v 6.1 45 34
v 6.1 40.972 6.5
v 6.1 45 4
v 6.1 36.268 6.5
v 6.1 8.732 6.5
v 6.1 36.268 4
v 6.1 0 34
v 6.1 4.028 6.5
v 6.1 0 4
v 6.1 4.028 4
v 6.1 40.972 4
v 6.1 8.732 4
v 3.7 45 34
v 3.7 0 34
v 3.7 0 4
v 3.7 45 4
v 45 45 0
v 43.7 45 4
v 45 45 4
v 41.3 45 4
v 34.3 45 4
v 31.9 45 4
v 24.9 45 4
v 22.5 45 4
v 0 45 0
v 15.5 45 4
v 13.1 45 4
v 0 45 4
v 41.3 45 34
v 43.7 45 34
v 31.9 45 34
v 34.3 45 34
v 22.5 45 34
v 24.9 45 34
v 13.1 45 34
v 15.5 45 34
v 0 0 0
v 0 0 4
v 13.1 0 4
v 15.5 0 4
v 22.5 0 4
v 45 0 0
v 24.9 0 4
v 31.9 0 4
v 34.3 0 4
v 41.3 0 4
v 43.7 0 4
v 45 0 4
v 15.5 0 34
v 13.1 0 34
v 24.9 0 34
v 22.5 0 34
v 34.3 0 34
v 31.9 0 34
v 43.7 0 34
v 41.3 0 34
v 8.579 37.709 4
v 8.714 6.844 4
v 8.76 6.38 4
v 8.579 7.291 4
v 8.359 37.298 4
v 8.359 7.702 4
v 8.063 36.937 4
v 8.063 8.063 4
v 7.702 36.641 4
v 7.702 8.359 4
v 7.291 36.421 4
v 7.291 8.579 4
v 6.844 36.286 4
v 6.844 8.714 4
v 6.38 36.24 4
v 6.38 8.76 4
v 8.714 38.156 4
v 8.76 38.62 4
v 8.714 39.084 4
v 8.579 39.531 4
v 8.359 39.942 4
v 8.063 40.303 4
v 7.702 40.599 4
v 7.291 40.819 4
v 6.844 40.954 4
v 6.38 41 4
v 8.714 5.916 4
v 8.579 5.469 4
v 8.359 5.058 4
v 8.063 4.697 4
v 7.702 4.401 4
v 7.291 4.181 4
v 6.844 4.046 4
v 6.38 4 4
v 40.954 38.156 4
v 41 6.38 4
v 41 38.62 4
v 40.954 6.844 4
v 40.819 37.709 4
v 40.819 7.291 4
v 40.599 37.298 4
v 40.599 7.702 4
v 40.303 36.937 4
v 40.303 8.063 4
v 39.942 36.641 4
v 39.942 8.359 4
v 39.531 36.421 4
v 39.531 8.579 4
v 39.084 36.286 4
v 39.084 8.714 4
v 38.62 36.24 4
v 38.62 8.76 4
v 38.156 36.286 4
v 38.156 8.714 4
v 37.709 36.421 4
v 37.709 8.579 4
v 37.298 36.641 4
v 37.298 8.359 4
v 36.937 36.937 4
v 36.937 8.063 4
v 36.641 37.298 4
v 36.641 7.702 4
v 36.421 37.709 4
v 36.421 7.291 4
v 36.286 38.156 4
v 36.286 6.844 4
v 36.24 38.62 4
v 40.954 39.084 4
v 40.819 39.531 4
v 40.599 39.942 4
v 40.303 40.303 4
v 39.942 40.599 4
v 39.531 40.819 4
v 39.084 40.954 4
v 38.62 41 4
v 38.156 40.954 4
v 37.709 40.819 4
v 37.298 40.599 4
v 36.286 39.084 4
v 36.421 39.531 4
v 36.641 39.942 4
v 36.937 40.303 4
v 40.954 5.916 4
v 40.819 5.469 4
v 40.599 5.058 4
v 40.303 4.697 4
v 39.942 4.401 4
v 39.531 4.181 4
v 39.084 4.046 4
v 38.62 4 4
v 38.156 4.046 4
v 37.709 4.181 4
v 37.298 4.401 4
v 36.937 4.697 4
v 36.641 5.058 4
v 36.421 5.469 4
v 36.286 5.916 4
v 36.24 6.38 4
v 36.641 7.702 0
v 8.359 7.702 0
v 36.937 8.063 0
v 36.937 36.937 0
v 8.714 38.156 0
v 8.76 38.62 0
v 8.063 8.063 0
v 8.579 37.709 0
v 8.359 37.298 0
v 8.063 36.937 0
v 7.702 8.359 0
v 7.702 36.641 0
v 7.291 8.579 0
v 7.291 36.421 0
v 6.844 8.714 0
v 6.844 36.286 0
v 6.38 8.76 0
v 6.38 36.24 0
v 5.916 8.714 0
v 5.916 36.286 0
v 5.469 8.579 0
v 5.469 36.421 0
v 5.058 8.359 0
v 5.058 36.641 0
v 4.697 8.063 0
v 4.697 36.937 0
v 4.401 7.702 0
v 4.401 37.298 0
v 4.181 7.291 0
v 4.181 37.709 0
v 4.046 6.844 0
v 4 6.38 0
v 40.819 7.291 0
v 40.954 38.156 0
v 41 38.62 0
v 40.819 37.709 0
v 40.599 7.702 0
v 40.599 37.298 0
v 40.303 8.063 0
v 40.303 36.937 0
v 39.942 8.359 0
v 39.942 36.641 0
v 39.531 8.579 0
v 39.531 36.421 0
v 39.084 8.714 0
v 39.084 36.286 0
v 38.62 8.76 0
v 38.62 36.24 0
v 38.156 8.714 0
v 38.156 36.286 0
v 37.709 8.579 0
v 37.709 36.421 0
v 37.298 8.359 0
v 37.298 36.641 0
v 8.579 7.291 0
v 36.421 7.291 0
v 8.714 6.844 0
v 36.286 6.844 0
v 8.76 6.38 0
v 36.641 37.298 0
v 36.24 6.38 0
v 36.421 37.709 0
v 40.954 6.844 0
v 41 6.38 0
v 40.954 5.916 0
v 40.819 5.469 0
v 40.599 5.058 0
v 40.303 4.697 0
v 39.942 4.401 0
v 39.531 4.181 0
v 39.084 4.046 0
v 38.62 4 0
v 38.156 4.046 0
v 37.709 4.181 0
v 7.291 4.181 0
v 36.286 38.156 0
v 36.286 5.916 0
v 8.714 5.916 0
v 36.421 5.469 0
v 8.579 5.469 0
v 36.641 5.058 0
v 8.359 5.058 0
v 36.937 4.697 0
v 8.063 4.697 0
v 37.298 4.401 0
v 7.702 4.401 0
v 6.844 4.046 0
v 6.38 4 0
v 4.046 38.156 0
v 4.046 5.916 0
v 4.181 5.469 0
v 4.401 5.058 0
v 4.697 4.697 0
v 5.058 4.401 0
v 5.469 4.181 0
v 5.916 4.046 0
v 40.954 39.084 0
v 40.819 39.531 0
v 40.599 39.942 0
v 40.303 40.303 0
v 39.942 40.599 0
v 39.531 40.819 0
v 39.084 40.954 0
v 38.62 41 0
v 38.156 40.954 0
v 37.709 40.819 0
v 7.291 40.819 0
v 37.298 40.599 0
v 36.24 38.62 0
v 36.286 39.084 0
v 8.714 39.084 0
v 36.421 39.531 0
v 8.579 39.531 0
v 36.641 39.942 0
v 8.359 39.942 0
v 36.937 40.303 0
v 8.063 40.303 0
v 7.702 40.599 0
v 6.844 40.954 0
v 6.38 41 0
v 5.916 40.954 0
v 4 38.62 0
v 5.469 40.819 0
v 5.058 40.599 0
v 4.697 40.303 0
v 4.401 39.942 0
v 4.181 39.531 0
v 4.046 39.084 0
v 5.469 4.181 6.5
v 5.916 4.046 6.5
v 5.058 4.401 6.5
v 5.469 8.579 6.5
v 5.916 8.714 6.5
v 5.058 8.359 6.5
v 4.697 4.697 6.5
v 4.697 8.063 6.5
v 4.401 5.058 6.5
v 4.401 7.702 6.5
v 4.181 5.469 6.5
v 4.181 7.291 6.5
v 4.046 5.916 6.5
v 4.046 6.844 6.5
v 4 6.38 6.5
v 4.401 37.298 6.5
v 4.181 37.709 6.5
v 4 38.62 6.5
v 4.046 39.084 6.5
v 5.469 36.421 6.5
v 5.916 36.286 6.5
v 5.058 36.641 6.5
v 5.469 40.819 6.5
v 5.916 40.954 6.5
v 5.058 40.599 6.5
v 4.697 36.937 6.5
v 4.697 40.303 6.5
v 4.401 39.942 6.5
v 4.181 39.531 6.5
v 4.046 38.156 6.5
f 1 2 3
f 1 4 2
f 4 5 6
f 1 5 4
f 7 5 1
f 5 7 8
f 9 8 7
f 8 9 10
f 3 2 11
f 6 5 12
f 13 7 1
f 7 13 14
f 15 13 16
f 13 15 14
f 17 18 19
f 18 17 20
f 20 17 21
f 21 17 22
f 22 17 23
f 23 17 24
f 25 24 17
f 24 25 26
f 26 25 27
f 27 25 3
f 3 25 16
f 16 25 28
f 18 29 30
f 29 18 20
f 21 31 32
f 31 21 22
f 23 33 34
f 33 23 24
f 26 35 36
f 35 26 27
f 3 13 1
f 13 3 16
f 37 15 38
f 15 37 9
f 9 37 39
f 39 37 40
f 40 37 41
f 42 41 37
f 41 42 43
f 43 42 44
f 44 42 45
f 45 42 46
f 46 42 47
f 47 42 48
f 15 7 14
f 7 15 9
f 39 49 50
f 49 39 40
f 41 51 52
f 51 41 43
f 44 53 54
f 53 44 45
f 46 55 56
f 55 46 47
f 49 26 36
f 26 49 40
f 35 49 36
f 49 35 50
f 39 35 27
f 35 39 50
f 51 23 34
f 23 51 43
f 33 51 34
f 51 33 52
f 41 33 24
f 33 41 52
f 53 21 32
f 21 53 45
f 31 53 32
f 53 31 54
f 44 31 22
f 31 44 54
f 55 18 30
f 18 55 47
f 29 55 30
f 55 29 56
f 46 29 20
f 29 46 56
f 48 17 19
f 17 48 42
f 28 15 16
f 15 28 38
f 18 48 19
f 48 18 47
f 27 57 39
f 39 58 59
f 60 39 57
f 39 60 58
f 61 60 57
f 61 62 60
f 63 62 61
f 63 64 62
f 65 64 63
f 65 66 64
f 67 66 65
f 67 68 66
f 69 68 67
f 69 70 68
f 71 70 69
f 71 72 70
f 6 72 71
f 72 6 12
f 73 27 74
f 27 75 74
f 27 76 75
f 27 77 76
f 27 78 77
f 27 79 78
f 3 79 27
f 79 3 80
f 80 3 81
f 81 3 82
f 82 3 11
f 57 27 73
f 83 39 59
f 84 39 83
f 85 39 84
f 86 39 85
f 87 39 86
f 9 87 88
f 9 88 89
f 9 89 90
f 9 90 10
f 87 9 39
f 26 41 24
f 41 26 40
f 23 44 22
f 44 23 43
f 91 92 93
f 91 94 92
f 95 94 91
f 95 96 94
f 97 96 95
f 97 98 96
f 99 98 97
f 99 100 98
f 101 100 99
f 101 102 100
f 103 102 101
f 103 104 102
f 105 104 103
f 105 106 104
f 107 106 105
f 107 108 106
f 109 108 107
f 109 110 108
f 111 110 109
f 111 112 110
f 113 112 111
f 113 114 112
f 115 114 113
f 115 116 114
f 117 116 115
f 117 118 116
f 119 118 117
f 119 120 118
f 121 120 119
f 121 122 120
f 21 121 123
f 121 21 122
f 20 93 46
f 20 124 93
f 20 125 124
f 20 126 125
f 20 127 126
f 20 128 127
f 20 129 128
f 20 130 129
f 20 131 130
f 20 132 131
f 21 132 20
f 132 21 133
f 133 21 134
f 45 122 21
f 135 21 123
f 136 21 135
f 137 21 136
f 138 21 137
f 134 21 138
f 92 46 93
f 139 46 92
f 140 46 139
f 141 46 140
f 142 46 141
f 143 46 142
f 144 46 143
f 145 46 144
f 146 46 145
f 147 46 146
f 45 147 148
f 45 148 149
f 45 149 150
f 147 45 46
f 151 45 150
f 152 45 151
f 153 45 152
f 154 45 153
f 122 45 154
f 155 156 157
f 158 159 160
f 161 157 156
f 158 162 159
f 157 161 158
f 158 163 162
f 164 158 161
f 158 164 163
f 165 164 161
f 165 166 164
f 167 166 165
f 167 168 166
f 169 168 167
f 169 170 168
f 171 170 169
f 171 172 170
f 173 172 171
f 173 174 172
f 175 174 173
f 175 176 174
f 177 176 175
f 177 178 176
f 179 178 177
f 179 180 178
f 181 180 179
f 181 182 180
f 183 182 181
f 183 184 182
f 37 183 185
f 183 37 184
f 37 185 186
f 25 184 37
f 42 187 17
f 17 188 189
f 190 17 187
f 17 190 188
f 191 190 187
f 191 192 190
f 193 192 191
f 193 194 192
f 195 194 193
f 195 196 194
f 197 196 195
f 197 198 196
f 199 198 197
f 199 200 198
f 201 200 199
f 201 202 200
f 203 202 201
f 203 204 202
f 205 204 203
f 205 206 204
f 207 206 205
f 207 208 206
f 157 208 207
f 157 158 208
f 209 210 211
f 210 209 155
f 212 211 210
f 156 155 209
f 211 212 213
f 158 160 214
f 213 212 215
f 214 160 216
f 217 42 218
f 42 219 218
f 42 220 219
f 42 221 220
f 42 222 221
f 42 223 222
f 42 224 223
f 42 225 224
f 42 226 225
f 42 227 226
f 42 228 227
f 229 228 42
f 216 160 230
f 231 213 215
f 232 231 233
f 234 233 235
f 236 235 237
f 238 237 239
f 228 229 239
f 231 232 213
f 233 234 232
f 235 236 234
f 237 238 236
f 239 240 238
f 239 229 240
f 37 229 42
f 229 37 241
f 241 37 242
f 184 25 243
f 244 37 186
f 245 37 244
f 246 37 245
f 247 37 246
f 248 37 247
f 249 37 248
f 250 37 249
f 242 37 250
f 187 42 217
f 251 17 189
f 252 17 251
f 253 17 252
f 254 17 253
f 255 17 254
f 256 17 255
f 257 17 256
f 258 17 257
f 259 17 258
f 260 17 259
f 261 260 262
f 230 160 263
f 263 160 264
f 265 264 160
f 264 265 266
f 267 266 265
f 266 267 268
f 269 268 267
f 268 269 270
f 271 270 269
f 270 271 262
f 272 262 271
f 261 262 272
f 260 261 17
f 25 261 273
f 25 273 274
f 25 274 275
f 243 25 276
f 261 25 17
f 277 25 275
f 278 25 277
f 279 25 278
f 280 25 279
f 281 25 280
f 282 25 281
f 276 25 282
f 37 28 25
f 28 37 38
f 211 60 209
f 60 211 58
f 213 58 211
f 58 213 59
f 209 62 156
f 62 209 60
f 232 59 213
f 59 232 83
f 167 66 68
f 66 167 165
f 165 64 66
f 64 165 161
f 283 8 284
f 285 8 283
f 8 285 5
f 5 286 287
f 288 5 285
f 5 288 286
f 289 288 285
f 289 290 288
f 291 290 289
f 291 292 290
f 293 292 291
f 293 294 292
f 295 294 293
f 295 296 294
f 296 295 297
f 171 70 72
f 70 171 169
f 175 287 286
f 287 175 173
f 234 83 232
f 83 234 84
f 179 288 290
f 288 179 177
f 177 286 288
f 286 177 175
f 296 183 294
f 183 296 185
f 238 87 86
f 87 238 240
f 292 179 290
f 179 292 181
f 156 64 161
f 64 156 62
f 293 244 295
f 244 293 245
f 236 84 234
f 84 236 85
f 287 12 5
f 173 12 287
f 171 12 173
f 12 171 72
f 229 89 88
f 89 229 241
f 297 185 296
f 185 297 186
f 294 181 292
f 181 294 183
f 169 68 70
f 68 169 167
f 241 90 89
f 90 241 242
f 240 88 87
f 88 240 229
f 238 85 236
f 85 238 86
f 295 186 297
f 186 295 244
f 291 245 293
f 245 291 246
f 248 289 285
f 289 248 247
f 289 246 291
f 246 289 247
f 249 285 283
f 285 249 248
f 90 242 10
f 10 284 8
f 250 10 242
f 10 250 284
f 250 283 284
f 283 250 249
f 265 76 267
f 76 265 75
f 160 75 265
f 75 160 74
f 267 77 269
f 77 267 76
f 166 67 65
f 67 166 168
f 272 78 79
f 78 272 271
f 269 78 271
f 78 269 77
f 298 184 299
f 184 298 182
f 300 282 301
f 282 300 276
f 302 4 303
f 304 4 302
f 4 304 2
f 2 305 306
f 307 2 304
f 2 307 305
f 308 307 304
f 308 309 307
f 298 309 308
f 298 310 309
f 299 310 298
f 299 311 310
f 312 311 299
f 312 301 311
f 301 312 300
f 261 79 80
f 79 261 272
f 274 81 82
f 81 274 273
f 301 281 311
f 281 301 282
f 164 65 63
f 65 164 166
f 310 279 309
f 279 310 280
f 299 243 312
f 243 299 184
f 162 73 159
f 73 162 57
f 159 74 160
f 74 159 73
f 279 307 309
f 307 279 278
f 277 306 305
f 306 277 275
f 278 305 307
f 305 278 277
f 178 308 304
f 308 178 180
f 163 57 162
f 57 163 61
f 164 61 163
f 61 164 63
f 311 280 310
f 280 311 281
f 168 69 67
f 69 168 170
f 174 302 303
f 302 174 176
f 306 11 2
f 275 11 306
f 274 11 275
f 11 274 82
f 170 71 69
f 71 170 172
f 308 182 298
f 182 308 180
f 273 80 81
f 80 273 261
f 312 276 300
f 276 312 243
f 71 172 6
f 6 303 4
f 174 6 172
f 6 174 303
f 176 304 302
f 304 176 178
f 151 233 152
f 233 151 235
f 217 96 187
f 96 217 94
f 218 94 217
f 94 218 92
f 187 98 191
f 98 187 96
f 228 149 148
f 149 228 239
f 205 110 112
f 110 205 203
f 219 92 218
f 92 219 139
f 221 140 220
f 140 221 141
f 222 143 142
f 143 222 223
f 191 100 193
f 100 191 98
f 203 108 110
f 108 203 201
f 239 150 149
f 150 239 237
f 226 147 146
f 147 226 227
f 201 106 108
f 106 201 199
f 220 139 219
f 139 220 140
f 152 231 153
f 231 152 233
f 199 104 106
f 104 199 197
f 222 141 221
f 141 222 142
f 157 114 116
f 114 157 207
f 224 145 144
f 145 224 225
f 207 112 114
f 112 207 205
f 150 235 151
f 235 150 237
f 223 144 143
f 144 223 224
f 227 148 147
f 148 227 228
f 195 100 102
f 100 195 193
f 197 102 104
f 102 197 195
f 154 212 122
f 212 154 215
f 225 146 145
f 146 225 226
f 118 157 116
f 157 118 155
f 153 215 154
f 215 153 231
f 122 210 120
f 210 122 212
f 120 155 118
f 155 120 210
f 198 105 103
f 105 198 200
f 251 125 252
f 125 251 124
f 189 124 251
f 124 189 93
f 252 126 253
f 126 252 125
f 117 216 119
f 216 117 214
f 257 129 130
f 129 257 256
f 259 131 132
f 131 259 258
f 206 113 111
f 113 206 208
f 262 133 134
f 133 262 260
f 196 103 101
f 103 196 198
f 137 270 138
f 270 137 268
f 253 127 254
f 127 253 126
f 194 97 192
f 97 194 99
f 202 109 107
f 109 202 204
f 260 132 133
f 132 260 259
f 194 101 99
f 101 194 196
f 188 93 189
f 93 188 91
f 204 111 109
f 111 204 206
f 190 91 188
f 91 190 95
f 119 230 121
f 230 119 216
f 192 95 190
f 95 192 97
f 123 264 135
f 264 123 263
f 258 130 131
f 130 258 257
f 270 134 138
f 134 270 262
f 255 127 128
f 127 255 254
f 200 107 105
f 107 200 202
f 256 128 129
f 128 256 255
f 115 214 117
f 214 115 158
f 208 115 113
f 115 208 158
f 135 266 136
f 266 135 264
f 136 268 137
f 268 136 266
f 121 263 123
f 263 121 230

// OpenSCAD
$fn = 32;

// ----------------------------------------------------------------------
// Finned heat sink: 45 x 45 mm base, 30 mm fins
// ----------------------------------------------------------------------

// --- parameters (mm) ---
base_w = 45;              // base width
base_d = 45;              // base depth
base_t = 4;               // base thickness
fin_h = 30;               // fin height above the base
holes_d = 4.76;           // fixing holes
hole_x = 16.12;           // hole offset in x
hole_y = 16.12;           // hole offset in y
fin_t = 2.4;              // fin thickness
fin_pitch = 9.4;          // fin pitch
fin_count = 5;            // number of fins
fin_x0 = 3.7;             // first fin offset

difference() {
  union() {
    cube([base_w, base_d, base_t]);
    for (i = [0 : fin_count - 1]) {
      translate([fin_x0 + i * fin_pitch, 0, base_t - 0.5]) cube([fin_t, base_d, fin_h + 0.5]);
    }
  }
  /* fixing holes through the base, 2.5 mm clear on both sides */
  for (hx = [-16.12, 16.12]) {
    for (hy = [-16.12, 16.12]) {
      translate([base_w / 2 + hx, base_d / 2 + hy, -2.5]) cylinder(h = base_t + 5, d = holes_d);
    }
  }
}
